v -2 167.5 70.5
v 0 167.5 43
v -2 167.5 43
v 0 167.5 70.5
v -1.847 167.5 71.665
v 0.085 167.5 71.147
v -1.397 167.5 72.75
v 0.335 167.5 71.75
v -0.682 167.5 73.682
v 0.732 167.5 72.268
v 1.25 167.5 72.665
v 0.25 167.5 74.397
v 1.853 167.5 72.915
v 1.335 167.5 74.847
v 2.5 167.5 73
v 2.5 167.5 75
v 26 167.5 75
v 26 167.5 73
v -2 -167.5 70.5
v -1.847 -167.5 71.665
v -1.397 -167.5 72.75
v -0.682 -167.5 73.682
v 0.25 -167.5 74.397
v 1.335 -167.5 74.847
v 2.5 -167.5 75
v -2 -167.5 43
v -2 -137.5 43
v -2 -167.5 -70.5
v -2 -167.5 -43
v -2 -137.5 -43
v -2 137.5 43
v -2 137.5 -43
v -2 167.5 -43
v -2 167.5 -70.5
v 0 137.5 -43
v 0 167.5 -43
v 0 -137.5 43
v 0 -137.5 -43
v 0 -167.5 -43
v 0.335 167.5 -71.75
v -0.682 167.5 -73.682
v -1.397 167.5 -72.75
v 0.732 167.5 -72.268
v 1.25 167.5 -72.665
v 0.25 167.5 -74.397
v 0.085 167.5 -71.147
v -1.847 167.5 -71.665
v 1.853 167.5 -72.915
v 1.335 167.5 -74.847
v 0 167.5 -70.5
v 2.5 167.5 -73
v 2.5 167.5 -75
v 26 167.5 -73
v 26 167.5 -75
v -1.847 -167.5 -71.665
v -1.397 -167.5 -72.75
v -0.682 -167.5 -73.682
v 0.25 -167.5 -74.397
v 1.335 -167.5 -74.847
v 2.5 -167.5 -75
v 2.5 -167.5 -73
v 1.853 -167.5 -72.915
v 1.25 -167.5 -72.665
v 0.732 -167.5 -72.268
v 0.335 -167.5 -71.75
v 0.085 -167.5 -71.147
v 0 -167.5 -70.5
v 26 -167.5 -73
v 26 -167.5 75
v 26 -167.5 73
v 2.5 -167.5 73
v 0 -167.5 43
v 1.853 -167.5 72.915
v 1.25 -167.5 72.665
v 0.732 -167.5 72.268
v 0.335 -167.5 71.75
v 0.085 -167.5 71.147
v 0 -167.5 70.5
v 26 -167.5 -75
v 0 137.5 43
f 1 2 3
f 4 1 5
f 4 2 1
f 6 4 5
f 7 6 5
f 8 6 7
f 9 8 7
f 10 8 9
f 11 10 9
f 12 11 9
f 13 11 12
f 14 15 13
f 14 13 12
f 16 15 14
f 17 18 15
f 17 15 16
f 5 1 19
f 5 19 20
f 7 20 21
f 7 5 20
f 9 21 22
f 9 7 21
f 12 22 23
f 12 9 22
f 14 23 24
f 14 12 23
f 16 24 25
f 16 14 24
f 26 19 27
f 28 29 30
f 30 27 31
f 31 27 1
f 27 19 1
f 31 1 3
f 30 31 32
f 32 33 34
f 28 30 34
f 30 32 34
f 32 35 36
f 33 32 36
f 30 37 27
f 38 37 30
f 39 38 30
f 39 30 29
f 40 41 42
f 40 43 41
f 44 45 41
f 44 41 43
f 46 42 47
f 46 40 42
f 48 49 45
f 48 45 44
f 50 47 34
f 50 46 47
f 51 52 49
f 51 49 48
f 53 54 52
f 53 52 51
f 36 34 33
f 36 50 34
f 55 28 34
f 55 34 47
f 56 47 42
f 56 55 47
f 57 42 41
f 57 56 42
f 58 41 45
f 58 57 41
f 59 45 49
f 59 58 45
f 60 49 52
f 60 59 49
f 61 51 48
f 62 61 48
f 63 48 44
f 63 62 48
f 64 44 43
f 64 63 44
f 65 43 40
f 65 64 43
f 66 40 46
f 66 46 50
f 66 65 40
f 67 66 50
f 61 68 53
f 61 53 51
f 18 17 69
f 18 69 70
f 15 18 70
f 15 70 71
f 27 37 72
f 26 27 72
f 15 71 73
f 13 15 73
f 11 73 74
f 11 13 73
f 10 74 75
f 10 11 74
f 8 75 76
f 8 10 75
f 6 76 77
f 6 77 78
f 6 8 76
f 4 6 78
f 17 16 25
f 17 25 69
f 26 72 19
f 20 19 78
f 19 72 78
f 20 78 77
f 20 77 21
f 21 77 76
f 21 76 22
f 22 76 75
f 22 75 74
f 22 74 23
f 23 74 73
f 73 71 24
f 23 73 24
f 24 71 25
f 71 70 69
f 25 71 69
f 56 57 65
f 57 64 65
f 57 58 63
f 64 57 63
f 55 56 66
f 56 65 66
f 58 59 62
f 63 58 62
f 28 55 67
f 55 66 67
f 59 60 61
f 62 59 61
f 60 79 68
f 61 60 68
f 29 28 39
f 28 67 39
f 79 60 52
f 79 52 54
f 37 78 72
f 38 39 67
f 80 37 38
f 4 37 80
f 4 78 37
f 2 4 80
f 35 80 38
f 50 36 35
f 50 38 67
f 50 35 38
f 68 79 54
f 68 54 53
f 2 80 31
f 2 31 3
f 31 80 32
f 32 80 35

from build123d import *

# Parameters (mm, degrees)
SKETCH1_W                      = 150
SKETCH1_H                      = 335
BASE_FLANGE1_DEPTH             = 2
EDGE_FLANGE1_STRIP_W           = 13
EDGE_FLANGE1_STRIP_H           = 2
EDGE_FLANGE1_STRIP_CUT_DEPTH   = 335
EDGE_FLANGE1_STRIP_2_W         = 13
EDGE_FLANGE1_STRIP_2_H         = 2
EDGE_FLANGE1_STRIP_CUT_2_DEPTH = 335
EDGE_FLANGE1_DEPTH             = 335
EDGE_FLANGE1_BEND_DEPTH        = 335
SKETCH11_W                     = 86
SKETCH11_H                     = 30
CUT_EXTRUDE1_DEPTH             = 10


# Sheet-metal steps are written as plain solids
with BuildPart() as part:
    # Sketch1 → Base-Flange1 (new body)
    with BuildSketch(Plane(origin=(0, 0, 0), x_dir=(0, 0, -1), z_dir=(1, 0, 0))):
        Rectangle(SKETCH1_W, SKETCH1_H)
    extrude(amount=-BASE_FLANGE1_DEPTH)

    # Edge-Flange1 strip (across the edge) → Edge-Flange1 strip cut (cut)
    with BuildSketch(Plane(origin=(0, -167.5, -75), x_dir=(0, 0, 1), z_dir=(0, 1, 0))):
        with Locations((-2, -1)):
            Rectangle(EDGE_FLANGE1_STRIP_W, EDGE_FLANGE1_STRIP_H)
    extrude(amount=EDGE_FLANGE1_STRIP_CUT_DEPTH, mode=Mode.SUBTRACT)

    # Edge-Flange1 strip 2 (across the edge) → Edge-Flange1 strip cut 2 (cut)
    with BuildSketch(Plane(origin=(0, 167.5, 75), x_dir=(0, 0, -1), z_dir=(0, -1, 0))):
        with Locations((-2, -1)):
            Rectangle(EDGE_FLANGE1_STRIP_2_W, EDGE_FLANGE1_STRIP_2_H)
    extrude(amount=EDGE_FLANGE1_STRIP_CUT_2_DEPTH, mode=Mode.SUBTRACT)

    # Edge-Flange1 section (across the edge) → Edge-Flange1 (add)
    with BuildSketch(Plane(origin=(0, -167.5, -75), x_dir=(0, 0, 1), z_dir=(0, 1, 0))):
        with BuildLine():
            Line((0, 2.5), (0, 26))
            Line((0, 26), (2, 26))
            Line((2, 26), (2, 2.5))
            ThreePointArc((2, 2.5), (2.732233047, 0.732233047), (4.5, 0))
            Line((4.5, 0), (4.5, -2))
            ThreePointArc((4.5, -2), (1.318019485, -0.681980515), (0, 2.5))
        make_face()
    extrude(amount=EDGE_FLANGE1_DEPTH)

    # Edge-Flange1 section 2 (across the edge) → Edge-Flange1 bend (add)
    with BuildSketch(Plane(origin=(0, 167.5, 75), x_dir=(0, 0, -1), z_dir=(0, -1, 0))):
        with BuildLine():
            Line((0, 2.5), (0, 26))
            Line((0, 26), (2, 26))
            Line((2, 26), (2, 2.5))
            ThreePointArc((2, 2.5), (2.732233047, 0.732233047), (4.5, 0))
            Line((4.5, 0), (4.5, -2))
            ThreePointArc((4.5, -2), (1.318019485, -0.681980515), (0, 2.5))
        make_face()
    extrude(amount=EDGE_FLANGE1_BEND_DEPTH)

    # Sketch11 → Cut-Extrude1 (cut)
    with BuildSketch(Plane(origin=(0, 0, 0), x_dir=(0, 0, -1), z_dir=(1, 0, 0))):
        with Locations((0, 152.5)):
            Rectangle(SKETCH11_W, SKETCH11_H)
    cut_extrude1 = extrude(amount=-CUT_EXTRUDE1_DEPTH, mode=Mode.SUBTRACT)

    # Mirror1: Cut-Extrude1 across plane
    add(cut_extrude1.mirror(Plane.ZX), mode=Mode.SUBTRACT)


solid = part.part
